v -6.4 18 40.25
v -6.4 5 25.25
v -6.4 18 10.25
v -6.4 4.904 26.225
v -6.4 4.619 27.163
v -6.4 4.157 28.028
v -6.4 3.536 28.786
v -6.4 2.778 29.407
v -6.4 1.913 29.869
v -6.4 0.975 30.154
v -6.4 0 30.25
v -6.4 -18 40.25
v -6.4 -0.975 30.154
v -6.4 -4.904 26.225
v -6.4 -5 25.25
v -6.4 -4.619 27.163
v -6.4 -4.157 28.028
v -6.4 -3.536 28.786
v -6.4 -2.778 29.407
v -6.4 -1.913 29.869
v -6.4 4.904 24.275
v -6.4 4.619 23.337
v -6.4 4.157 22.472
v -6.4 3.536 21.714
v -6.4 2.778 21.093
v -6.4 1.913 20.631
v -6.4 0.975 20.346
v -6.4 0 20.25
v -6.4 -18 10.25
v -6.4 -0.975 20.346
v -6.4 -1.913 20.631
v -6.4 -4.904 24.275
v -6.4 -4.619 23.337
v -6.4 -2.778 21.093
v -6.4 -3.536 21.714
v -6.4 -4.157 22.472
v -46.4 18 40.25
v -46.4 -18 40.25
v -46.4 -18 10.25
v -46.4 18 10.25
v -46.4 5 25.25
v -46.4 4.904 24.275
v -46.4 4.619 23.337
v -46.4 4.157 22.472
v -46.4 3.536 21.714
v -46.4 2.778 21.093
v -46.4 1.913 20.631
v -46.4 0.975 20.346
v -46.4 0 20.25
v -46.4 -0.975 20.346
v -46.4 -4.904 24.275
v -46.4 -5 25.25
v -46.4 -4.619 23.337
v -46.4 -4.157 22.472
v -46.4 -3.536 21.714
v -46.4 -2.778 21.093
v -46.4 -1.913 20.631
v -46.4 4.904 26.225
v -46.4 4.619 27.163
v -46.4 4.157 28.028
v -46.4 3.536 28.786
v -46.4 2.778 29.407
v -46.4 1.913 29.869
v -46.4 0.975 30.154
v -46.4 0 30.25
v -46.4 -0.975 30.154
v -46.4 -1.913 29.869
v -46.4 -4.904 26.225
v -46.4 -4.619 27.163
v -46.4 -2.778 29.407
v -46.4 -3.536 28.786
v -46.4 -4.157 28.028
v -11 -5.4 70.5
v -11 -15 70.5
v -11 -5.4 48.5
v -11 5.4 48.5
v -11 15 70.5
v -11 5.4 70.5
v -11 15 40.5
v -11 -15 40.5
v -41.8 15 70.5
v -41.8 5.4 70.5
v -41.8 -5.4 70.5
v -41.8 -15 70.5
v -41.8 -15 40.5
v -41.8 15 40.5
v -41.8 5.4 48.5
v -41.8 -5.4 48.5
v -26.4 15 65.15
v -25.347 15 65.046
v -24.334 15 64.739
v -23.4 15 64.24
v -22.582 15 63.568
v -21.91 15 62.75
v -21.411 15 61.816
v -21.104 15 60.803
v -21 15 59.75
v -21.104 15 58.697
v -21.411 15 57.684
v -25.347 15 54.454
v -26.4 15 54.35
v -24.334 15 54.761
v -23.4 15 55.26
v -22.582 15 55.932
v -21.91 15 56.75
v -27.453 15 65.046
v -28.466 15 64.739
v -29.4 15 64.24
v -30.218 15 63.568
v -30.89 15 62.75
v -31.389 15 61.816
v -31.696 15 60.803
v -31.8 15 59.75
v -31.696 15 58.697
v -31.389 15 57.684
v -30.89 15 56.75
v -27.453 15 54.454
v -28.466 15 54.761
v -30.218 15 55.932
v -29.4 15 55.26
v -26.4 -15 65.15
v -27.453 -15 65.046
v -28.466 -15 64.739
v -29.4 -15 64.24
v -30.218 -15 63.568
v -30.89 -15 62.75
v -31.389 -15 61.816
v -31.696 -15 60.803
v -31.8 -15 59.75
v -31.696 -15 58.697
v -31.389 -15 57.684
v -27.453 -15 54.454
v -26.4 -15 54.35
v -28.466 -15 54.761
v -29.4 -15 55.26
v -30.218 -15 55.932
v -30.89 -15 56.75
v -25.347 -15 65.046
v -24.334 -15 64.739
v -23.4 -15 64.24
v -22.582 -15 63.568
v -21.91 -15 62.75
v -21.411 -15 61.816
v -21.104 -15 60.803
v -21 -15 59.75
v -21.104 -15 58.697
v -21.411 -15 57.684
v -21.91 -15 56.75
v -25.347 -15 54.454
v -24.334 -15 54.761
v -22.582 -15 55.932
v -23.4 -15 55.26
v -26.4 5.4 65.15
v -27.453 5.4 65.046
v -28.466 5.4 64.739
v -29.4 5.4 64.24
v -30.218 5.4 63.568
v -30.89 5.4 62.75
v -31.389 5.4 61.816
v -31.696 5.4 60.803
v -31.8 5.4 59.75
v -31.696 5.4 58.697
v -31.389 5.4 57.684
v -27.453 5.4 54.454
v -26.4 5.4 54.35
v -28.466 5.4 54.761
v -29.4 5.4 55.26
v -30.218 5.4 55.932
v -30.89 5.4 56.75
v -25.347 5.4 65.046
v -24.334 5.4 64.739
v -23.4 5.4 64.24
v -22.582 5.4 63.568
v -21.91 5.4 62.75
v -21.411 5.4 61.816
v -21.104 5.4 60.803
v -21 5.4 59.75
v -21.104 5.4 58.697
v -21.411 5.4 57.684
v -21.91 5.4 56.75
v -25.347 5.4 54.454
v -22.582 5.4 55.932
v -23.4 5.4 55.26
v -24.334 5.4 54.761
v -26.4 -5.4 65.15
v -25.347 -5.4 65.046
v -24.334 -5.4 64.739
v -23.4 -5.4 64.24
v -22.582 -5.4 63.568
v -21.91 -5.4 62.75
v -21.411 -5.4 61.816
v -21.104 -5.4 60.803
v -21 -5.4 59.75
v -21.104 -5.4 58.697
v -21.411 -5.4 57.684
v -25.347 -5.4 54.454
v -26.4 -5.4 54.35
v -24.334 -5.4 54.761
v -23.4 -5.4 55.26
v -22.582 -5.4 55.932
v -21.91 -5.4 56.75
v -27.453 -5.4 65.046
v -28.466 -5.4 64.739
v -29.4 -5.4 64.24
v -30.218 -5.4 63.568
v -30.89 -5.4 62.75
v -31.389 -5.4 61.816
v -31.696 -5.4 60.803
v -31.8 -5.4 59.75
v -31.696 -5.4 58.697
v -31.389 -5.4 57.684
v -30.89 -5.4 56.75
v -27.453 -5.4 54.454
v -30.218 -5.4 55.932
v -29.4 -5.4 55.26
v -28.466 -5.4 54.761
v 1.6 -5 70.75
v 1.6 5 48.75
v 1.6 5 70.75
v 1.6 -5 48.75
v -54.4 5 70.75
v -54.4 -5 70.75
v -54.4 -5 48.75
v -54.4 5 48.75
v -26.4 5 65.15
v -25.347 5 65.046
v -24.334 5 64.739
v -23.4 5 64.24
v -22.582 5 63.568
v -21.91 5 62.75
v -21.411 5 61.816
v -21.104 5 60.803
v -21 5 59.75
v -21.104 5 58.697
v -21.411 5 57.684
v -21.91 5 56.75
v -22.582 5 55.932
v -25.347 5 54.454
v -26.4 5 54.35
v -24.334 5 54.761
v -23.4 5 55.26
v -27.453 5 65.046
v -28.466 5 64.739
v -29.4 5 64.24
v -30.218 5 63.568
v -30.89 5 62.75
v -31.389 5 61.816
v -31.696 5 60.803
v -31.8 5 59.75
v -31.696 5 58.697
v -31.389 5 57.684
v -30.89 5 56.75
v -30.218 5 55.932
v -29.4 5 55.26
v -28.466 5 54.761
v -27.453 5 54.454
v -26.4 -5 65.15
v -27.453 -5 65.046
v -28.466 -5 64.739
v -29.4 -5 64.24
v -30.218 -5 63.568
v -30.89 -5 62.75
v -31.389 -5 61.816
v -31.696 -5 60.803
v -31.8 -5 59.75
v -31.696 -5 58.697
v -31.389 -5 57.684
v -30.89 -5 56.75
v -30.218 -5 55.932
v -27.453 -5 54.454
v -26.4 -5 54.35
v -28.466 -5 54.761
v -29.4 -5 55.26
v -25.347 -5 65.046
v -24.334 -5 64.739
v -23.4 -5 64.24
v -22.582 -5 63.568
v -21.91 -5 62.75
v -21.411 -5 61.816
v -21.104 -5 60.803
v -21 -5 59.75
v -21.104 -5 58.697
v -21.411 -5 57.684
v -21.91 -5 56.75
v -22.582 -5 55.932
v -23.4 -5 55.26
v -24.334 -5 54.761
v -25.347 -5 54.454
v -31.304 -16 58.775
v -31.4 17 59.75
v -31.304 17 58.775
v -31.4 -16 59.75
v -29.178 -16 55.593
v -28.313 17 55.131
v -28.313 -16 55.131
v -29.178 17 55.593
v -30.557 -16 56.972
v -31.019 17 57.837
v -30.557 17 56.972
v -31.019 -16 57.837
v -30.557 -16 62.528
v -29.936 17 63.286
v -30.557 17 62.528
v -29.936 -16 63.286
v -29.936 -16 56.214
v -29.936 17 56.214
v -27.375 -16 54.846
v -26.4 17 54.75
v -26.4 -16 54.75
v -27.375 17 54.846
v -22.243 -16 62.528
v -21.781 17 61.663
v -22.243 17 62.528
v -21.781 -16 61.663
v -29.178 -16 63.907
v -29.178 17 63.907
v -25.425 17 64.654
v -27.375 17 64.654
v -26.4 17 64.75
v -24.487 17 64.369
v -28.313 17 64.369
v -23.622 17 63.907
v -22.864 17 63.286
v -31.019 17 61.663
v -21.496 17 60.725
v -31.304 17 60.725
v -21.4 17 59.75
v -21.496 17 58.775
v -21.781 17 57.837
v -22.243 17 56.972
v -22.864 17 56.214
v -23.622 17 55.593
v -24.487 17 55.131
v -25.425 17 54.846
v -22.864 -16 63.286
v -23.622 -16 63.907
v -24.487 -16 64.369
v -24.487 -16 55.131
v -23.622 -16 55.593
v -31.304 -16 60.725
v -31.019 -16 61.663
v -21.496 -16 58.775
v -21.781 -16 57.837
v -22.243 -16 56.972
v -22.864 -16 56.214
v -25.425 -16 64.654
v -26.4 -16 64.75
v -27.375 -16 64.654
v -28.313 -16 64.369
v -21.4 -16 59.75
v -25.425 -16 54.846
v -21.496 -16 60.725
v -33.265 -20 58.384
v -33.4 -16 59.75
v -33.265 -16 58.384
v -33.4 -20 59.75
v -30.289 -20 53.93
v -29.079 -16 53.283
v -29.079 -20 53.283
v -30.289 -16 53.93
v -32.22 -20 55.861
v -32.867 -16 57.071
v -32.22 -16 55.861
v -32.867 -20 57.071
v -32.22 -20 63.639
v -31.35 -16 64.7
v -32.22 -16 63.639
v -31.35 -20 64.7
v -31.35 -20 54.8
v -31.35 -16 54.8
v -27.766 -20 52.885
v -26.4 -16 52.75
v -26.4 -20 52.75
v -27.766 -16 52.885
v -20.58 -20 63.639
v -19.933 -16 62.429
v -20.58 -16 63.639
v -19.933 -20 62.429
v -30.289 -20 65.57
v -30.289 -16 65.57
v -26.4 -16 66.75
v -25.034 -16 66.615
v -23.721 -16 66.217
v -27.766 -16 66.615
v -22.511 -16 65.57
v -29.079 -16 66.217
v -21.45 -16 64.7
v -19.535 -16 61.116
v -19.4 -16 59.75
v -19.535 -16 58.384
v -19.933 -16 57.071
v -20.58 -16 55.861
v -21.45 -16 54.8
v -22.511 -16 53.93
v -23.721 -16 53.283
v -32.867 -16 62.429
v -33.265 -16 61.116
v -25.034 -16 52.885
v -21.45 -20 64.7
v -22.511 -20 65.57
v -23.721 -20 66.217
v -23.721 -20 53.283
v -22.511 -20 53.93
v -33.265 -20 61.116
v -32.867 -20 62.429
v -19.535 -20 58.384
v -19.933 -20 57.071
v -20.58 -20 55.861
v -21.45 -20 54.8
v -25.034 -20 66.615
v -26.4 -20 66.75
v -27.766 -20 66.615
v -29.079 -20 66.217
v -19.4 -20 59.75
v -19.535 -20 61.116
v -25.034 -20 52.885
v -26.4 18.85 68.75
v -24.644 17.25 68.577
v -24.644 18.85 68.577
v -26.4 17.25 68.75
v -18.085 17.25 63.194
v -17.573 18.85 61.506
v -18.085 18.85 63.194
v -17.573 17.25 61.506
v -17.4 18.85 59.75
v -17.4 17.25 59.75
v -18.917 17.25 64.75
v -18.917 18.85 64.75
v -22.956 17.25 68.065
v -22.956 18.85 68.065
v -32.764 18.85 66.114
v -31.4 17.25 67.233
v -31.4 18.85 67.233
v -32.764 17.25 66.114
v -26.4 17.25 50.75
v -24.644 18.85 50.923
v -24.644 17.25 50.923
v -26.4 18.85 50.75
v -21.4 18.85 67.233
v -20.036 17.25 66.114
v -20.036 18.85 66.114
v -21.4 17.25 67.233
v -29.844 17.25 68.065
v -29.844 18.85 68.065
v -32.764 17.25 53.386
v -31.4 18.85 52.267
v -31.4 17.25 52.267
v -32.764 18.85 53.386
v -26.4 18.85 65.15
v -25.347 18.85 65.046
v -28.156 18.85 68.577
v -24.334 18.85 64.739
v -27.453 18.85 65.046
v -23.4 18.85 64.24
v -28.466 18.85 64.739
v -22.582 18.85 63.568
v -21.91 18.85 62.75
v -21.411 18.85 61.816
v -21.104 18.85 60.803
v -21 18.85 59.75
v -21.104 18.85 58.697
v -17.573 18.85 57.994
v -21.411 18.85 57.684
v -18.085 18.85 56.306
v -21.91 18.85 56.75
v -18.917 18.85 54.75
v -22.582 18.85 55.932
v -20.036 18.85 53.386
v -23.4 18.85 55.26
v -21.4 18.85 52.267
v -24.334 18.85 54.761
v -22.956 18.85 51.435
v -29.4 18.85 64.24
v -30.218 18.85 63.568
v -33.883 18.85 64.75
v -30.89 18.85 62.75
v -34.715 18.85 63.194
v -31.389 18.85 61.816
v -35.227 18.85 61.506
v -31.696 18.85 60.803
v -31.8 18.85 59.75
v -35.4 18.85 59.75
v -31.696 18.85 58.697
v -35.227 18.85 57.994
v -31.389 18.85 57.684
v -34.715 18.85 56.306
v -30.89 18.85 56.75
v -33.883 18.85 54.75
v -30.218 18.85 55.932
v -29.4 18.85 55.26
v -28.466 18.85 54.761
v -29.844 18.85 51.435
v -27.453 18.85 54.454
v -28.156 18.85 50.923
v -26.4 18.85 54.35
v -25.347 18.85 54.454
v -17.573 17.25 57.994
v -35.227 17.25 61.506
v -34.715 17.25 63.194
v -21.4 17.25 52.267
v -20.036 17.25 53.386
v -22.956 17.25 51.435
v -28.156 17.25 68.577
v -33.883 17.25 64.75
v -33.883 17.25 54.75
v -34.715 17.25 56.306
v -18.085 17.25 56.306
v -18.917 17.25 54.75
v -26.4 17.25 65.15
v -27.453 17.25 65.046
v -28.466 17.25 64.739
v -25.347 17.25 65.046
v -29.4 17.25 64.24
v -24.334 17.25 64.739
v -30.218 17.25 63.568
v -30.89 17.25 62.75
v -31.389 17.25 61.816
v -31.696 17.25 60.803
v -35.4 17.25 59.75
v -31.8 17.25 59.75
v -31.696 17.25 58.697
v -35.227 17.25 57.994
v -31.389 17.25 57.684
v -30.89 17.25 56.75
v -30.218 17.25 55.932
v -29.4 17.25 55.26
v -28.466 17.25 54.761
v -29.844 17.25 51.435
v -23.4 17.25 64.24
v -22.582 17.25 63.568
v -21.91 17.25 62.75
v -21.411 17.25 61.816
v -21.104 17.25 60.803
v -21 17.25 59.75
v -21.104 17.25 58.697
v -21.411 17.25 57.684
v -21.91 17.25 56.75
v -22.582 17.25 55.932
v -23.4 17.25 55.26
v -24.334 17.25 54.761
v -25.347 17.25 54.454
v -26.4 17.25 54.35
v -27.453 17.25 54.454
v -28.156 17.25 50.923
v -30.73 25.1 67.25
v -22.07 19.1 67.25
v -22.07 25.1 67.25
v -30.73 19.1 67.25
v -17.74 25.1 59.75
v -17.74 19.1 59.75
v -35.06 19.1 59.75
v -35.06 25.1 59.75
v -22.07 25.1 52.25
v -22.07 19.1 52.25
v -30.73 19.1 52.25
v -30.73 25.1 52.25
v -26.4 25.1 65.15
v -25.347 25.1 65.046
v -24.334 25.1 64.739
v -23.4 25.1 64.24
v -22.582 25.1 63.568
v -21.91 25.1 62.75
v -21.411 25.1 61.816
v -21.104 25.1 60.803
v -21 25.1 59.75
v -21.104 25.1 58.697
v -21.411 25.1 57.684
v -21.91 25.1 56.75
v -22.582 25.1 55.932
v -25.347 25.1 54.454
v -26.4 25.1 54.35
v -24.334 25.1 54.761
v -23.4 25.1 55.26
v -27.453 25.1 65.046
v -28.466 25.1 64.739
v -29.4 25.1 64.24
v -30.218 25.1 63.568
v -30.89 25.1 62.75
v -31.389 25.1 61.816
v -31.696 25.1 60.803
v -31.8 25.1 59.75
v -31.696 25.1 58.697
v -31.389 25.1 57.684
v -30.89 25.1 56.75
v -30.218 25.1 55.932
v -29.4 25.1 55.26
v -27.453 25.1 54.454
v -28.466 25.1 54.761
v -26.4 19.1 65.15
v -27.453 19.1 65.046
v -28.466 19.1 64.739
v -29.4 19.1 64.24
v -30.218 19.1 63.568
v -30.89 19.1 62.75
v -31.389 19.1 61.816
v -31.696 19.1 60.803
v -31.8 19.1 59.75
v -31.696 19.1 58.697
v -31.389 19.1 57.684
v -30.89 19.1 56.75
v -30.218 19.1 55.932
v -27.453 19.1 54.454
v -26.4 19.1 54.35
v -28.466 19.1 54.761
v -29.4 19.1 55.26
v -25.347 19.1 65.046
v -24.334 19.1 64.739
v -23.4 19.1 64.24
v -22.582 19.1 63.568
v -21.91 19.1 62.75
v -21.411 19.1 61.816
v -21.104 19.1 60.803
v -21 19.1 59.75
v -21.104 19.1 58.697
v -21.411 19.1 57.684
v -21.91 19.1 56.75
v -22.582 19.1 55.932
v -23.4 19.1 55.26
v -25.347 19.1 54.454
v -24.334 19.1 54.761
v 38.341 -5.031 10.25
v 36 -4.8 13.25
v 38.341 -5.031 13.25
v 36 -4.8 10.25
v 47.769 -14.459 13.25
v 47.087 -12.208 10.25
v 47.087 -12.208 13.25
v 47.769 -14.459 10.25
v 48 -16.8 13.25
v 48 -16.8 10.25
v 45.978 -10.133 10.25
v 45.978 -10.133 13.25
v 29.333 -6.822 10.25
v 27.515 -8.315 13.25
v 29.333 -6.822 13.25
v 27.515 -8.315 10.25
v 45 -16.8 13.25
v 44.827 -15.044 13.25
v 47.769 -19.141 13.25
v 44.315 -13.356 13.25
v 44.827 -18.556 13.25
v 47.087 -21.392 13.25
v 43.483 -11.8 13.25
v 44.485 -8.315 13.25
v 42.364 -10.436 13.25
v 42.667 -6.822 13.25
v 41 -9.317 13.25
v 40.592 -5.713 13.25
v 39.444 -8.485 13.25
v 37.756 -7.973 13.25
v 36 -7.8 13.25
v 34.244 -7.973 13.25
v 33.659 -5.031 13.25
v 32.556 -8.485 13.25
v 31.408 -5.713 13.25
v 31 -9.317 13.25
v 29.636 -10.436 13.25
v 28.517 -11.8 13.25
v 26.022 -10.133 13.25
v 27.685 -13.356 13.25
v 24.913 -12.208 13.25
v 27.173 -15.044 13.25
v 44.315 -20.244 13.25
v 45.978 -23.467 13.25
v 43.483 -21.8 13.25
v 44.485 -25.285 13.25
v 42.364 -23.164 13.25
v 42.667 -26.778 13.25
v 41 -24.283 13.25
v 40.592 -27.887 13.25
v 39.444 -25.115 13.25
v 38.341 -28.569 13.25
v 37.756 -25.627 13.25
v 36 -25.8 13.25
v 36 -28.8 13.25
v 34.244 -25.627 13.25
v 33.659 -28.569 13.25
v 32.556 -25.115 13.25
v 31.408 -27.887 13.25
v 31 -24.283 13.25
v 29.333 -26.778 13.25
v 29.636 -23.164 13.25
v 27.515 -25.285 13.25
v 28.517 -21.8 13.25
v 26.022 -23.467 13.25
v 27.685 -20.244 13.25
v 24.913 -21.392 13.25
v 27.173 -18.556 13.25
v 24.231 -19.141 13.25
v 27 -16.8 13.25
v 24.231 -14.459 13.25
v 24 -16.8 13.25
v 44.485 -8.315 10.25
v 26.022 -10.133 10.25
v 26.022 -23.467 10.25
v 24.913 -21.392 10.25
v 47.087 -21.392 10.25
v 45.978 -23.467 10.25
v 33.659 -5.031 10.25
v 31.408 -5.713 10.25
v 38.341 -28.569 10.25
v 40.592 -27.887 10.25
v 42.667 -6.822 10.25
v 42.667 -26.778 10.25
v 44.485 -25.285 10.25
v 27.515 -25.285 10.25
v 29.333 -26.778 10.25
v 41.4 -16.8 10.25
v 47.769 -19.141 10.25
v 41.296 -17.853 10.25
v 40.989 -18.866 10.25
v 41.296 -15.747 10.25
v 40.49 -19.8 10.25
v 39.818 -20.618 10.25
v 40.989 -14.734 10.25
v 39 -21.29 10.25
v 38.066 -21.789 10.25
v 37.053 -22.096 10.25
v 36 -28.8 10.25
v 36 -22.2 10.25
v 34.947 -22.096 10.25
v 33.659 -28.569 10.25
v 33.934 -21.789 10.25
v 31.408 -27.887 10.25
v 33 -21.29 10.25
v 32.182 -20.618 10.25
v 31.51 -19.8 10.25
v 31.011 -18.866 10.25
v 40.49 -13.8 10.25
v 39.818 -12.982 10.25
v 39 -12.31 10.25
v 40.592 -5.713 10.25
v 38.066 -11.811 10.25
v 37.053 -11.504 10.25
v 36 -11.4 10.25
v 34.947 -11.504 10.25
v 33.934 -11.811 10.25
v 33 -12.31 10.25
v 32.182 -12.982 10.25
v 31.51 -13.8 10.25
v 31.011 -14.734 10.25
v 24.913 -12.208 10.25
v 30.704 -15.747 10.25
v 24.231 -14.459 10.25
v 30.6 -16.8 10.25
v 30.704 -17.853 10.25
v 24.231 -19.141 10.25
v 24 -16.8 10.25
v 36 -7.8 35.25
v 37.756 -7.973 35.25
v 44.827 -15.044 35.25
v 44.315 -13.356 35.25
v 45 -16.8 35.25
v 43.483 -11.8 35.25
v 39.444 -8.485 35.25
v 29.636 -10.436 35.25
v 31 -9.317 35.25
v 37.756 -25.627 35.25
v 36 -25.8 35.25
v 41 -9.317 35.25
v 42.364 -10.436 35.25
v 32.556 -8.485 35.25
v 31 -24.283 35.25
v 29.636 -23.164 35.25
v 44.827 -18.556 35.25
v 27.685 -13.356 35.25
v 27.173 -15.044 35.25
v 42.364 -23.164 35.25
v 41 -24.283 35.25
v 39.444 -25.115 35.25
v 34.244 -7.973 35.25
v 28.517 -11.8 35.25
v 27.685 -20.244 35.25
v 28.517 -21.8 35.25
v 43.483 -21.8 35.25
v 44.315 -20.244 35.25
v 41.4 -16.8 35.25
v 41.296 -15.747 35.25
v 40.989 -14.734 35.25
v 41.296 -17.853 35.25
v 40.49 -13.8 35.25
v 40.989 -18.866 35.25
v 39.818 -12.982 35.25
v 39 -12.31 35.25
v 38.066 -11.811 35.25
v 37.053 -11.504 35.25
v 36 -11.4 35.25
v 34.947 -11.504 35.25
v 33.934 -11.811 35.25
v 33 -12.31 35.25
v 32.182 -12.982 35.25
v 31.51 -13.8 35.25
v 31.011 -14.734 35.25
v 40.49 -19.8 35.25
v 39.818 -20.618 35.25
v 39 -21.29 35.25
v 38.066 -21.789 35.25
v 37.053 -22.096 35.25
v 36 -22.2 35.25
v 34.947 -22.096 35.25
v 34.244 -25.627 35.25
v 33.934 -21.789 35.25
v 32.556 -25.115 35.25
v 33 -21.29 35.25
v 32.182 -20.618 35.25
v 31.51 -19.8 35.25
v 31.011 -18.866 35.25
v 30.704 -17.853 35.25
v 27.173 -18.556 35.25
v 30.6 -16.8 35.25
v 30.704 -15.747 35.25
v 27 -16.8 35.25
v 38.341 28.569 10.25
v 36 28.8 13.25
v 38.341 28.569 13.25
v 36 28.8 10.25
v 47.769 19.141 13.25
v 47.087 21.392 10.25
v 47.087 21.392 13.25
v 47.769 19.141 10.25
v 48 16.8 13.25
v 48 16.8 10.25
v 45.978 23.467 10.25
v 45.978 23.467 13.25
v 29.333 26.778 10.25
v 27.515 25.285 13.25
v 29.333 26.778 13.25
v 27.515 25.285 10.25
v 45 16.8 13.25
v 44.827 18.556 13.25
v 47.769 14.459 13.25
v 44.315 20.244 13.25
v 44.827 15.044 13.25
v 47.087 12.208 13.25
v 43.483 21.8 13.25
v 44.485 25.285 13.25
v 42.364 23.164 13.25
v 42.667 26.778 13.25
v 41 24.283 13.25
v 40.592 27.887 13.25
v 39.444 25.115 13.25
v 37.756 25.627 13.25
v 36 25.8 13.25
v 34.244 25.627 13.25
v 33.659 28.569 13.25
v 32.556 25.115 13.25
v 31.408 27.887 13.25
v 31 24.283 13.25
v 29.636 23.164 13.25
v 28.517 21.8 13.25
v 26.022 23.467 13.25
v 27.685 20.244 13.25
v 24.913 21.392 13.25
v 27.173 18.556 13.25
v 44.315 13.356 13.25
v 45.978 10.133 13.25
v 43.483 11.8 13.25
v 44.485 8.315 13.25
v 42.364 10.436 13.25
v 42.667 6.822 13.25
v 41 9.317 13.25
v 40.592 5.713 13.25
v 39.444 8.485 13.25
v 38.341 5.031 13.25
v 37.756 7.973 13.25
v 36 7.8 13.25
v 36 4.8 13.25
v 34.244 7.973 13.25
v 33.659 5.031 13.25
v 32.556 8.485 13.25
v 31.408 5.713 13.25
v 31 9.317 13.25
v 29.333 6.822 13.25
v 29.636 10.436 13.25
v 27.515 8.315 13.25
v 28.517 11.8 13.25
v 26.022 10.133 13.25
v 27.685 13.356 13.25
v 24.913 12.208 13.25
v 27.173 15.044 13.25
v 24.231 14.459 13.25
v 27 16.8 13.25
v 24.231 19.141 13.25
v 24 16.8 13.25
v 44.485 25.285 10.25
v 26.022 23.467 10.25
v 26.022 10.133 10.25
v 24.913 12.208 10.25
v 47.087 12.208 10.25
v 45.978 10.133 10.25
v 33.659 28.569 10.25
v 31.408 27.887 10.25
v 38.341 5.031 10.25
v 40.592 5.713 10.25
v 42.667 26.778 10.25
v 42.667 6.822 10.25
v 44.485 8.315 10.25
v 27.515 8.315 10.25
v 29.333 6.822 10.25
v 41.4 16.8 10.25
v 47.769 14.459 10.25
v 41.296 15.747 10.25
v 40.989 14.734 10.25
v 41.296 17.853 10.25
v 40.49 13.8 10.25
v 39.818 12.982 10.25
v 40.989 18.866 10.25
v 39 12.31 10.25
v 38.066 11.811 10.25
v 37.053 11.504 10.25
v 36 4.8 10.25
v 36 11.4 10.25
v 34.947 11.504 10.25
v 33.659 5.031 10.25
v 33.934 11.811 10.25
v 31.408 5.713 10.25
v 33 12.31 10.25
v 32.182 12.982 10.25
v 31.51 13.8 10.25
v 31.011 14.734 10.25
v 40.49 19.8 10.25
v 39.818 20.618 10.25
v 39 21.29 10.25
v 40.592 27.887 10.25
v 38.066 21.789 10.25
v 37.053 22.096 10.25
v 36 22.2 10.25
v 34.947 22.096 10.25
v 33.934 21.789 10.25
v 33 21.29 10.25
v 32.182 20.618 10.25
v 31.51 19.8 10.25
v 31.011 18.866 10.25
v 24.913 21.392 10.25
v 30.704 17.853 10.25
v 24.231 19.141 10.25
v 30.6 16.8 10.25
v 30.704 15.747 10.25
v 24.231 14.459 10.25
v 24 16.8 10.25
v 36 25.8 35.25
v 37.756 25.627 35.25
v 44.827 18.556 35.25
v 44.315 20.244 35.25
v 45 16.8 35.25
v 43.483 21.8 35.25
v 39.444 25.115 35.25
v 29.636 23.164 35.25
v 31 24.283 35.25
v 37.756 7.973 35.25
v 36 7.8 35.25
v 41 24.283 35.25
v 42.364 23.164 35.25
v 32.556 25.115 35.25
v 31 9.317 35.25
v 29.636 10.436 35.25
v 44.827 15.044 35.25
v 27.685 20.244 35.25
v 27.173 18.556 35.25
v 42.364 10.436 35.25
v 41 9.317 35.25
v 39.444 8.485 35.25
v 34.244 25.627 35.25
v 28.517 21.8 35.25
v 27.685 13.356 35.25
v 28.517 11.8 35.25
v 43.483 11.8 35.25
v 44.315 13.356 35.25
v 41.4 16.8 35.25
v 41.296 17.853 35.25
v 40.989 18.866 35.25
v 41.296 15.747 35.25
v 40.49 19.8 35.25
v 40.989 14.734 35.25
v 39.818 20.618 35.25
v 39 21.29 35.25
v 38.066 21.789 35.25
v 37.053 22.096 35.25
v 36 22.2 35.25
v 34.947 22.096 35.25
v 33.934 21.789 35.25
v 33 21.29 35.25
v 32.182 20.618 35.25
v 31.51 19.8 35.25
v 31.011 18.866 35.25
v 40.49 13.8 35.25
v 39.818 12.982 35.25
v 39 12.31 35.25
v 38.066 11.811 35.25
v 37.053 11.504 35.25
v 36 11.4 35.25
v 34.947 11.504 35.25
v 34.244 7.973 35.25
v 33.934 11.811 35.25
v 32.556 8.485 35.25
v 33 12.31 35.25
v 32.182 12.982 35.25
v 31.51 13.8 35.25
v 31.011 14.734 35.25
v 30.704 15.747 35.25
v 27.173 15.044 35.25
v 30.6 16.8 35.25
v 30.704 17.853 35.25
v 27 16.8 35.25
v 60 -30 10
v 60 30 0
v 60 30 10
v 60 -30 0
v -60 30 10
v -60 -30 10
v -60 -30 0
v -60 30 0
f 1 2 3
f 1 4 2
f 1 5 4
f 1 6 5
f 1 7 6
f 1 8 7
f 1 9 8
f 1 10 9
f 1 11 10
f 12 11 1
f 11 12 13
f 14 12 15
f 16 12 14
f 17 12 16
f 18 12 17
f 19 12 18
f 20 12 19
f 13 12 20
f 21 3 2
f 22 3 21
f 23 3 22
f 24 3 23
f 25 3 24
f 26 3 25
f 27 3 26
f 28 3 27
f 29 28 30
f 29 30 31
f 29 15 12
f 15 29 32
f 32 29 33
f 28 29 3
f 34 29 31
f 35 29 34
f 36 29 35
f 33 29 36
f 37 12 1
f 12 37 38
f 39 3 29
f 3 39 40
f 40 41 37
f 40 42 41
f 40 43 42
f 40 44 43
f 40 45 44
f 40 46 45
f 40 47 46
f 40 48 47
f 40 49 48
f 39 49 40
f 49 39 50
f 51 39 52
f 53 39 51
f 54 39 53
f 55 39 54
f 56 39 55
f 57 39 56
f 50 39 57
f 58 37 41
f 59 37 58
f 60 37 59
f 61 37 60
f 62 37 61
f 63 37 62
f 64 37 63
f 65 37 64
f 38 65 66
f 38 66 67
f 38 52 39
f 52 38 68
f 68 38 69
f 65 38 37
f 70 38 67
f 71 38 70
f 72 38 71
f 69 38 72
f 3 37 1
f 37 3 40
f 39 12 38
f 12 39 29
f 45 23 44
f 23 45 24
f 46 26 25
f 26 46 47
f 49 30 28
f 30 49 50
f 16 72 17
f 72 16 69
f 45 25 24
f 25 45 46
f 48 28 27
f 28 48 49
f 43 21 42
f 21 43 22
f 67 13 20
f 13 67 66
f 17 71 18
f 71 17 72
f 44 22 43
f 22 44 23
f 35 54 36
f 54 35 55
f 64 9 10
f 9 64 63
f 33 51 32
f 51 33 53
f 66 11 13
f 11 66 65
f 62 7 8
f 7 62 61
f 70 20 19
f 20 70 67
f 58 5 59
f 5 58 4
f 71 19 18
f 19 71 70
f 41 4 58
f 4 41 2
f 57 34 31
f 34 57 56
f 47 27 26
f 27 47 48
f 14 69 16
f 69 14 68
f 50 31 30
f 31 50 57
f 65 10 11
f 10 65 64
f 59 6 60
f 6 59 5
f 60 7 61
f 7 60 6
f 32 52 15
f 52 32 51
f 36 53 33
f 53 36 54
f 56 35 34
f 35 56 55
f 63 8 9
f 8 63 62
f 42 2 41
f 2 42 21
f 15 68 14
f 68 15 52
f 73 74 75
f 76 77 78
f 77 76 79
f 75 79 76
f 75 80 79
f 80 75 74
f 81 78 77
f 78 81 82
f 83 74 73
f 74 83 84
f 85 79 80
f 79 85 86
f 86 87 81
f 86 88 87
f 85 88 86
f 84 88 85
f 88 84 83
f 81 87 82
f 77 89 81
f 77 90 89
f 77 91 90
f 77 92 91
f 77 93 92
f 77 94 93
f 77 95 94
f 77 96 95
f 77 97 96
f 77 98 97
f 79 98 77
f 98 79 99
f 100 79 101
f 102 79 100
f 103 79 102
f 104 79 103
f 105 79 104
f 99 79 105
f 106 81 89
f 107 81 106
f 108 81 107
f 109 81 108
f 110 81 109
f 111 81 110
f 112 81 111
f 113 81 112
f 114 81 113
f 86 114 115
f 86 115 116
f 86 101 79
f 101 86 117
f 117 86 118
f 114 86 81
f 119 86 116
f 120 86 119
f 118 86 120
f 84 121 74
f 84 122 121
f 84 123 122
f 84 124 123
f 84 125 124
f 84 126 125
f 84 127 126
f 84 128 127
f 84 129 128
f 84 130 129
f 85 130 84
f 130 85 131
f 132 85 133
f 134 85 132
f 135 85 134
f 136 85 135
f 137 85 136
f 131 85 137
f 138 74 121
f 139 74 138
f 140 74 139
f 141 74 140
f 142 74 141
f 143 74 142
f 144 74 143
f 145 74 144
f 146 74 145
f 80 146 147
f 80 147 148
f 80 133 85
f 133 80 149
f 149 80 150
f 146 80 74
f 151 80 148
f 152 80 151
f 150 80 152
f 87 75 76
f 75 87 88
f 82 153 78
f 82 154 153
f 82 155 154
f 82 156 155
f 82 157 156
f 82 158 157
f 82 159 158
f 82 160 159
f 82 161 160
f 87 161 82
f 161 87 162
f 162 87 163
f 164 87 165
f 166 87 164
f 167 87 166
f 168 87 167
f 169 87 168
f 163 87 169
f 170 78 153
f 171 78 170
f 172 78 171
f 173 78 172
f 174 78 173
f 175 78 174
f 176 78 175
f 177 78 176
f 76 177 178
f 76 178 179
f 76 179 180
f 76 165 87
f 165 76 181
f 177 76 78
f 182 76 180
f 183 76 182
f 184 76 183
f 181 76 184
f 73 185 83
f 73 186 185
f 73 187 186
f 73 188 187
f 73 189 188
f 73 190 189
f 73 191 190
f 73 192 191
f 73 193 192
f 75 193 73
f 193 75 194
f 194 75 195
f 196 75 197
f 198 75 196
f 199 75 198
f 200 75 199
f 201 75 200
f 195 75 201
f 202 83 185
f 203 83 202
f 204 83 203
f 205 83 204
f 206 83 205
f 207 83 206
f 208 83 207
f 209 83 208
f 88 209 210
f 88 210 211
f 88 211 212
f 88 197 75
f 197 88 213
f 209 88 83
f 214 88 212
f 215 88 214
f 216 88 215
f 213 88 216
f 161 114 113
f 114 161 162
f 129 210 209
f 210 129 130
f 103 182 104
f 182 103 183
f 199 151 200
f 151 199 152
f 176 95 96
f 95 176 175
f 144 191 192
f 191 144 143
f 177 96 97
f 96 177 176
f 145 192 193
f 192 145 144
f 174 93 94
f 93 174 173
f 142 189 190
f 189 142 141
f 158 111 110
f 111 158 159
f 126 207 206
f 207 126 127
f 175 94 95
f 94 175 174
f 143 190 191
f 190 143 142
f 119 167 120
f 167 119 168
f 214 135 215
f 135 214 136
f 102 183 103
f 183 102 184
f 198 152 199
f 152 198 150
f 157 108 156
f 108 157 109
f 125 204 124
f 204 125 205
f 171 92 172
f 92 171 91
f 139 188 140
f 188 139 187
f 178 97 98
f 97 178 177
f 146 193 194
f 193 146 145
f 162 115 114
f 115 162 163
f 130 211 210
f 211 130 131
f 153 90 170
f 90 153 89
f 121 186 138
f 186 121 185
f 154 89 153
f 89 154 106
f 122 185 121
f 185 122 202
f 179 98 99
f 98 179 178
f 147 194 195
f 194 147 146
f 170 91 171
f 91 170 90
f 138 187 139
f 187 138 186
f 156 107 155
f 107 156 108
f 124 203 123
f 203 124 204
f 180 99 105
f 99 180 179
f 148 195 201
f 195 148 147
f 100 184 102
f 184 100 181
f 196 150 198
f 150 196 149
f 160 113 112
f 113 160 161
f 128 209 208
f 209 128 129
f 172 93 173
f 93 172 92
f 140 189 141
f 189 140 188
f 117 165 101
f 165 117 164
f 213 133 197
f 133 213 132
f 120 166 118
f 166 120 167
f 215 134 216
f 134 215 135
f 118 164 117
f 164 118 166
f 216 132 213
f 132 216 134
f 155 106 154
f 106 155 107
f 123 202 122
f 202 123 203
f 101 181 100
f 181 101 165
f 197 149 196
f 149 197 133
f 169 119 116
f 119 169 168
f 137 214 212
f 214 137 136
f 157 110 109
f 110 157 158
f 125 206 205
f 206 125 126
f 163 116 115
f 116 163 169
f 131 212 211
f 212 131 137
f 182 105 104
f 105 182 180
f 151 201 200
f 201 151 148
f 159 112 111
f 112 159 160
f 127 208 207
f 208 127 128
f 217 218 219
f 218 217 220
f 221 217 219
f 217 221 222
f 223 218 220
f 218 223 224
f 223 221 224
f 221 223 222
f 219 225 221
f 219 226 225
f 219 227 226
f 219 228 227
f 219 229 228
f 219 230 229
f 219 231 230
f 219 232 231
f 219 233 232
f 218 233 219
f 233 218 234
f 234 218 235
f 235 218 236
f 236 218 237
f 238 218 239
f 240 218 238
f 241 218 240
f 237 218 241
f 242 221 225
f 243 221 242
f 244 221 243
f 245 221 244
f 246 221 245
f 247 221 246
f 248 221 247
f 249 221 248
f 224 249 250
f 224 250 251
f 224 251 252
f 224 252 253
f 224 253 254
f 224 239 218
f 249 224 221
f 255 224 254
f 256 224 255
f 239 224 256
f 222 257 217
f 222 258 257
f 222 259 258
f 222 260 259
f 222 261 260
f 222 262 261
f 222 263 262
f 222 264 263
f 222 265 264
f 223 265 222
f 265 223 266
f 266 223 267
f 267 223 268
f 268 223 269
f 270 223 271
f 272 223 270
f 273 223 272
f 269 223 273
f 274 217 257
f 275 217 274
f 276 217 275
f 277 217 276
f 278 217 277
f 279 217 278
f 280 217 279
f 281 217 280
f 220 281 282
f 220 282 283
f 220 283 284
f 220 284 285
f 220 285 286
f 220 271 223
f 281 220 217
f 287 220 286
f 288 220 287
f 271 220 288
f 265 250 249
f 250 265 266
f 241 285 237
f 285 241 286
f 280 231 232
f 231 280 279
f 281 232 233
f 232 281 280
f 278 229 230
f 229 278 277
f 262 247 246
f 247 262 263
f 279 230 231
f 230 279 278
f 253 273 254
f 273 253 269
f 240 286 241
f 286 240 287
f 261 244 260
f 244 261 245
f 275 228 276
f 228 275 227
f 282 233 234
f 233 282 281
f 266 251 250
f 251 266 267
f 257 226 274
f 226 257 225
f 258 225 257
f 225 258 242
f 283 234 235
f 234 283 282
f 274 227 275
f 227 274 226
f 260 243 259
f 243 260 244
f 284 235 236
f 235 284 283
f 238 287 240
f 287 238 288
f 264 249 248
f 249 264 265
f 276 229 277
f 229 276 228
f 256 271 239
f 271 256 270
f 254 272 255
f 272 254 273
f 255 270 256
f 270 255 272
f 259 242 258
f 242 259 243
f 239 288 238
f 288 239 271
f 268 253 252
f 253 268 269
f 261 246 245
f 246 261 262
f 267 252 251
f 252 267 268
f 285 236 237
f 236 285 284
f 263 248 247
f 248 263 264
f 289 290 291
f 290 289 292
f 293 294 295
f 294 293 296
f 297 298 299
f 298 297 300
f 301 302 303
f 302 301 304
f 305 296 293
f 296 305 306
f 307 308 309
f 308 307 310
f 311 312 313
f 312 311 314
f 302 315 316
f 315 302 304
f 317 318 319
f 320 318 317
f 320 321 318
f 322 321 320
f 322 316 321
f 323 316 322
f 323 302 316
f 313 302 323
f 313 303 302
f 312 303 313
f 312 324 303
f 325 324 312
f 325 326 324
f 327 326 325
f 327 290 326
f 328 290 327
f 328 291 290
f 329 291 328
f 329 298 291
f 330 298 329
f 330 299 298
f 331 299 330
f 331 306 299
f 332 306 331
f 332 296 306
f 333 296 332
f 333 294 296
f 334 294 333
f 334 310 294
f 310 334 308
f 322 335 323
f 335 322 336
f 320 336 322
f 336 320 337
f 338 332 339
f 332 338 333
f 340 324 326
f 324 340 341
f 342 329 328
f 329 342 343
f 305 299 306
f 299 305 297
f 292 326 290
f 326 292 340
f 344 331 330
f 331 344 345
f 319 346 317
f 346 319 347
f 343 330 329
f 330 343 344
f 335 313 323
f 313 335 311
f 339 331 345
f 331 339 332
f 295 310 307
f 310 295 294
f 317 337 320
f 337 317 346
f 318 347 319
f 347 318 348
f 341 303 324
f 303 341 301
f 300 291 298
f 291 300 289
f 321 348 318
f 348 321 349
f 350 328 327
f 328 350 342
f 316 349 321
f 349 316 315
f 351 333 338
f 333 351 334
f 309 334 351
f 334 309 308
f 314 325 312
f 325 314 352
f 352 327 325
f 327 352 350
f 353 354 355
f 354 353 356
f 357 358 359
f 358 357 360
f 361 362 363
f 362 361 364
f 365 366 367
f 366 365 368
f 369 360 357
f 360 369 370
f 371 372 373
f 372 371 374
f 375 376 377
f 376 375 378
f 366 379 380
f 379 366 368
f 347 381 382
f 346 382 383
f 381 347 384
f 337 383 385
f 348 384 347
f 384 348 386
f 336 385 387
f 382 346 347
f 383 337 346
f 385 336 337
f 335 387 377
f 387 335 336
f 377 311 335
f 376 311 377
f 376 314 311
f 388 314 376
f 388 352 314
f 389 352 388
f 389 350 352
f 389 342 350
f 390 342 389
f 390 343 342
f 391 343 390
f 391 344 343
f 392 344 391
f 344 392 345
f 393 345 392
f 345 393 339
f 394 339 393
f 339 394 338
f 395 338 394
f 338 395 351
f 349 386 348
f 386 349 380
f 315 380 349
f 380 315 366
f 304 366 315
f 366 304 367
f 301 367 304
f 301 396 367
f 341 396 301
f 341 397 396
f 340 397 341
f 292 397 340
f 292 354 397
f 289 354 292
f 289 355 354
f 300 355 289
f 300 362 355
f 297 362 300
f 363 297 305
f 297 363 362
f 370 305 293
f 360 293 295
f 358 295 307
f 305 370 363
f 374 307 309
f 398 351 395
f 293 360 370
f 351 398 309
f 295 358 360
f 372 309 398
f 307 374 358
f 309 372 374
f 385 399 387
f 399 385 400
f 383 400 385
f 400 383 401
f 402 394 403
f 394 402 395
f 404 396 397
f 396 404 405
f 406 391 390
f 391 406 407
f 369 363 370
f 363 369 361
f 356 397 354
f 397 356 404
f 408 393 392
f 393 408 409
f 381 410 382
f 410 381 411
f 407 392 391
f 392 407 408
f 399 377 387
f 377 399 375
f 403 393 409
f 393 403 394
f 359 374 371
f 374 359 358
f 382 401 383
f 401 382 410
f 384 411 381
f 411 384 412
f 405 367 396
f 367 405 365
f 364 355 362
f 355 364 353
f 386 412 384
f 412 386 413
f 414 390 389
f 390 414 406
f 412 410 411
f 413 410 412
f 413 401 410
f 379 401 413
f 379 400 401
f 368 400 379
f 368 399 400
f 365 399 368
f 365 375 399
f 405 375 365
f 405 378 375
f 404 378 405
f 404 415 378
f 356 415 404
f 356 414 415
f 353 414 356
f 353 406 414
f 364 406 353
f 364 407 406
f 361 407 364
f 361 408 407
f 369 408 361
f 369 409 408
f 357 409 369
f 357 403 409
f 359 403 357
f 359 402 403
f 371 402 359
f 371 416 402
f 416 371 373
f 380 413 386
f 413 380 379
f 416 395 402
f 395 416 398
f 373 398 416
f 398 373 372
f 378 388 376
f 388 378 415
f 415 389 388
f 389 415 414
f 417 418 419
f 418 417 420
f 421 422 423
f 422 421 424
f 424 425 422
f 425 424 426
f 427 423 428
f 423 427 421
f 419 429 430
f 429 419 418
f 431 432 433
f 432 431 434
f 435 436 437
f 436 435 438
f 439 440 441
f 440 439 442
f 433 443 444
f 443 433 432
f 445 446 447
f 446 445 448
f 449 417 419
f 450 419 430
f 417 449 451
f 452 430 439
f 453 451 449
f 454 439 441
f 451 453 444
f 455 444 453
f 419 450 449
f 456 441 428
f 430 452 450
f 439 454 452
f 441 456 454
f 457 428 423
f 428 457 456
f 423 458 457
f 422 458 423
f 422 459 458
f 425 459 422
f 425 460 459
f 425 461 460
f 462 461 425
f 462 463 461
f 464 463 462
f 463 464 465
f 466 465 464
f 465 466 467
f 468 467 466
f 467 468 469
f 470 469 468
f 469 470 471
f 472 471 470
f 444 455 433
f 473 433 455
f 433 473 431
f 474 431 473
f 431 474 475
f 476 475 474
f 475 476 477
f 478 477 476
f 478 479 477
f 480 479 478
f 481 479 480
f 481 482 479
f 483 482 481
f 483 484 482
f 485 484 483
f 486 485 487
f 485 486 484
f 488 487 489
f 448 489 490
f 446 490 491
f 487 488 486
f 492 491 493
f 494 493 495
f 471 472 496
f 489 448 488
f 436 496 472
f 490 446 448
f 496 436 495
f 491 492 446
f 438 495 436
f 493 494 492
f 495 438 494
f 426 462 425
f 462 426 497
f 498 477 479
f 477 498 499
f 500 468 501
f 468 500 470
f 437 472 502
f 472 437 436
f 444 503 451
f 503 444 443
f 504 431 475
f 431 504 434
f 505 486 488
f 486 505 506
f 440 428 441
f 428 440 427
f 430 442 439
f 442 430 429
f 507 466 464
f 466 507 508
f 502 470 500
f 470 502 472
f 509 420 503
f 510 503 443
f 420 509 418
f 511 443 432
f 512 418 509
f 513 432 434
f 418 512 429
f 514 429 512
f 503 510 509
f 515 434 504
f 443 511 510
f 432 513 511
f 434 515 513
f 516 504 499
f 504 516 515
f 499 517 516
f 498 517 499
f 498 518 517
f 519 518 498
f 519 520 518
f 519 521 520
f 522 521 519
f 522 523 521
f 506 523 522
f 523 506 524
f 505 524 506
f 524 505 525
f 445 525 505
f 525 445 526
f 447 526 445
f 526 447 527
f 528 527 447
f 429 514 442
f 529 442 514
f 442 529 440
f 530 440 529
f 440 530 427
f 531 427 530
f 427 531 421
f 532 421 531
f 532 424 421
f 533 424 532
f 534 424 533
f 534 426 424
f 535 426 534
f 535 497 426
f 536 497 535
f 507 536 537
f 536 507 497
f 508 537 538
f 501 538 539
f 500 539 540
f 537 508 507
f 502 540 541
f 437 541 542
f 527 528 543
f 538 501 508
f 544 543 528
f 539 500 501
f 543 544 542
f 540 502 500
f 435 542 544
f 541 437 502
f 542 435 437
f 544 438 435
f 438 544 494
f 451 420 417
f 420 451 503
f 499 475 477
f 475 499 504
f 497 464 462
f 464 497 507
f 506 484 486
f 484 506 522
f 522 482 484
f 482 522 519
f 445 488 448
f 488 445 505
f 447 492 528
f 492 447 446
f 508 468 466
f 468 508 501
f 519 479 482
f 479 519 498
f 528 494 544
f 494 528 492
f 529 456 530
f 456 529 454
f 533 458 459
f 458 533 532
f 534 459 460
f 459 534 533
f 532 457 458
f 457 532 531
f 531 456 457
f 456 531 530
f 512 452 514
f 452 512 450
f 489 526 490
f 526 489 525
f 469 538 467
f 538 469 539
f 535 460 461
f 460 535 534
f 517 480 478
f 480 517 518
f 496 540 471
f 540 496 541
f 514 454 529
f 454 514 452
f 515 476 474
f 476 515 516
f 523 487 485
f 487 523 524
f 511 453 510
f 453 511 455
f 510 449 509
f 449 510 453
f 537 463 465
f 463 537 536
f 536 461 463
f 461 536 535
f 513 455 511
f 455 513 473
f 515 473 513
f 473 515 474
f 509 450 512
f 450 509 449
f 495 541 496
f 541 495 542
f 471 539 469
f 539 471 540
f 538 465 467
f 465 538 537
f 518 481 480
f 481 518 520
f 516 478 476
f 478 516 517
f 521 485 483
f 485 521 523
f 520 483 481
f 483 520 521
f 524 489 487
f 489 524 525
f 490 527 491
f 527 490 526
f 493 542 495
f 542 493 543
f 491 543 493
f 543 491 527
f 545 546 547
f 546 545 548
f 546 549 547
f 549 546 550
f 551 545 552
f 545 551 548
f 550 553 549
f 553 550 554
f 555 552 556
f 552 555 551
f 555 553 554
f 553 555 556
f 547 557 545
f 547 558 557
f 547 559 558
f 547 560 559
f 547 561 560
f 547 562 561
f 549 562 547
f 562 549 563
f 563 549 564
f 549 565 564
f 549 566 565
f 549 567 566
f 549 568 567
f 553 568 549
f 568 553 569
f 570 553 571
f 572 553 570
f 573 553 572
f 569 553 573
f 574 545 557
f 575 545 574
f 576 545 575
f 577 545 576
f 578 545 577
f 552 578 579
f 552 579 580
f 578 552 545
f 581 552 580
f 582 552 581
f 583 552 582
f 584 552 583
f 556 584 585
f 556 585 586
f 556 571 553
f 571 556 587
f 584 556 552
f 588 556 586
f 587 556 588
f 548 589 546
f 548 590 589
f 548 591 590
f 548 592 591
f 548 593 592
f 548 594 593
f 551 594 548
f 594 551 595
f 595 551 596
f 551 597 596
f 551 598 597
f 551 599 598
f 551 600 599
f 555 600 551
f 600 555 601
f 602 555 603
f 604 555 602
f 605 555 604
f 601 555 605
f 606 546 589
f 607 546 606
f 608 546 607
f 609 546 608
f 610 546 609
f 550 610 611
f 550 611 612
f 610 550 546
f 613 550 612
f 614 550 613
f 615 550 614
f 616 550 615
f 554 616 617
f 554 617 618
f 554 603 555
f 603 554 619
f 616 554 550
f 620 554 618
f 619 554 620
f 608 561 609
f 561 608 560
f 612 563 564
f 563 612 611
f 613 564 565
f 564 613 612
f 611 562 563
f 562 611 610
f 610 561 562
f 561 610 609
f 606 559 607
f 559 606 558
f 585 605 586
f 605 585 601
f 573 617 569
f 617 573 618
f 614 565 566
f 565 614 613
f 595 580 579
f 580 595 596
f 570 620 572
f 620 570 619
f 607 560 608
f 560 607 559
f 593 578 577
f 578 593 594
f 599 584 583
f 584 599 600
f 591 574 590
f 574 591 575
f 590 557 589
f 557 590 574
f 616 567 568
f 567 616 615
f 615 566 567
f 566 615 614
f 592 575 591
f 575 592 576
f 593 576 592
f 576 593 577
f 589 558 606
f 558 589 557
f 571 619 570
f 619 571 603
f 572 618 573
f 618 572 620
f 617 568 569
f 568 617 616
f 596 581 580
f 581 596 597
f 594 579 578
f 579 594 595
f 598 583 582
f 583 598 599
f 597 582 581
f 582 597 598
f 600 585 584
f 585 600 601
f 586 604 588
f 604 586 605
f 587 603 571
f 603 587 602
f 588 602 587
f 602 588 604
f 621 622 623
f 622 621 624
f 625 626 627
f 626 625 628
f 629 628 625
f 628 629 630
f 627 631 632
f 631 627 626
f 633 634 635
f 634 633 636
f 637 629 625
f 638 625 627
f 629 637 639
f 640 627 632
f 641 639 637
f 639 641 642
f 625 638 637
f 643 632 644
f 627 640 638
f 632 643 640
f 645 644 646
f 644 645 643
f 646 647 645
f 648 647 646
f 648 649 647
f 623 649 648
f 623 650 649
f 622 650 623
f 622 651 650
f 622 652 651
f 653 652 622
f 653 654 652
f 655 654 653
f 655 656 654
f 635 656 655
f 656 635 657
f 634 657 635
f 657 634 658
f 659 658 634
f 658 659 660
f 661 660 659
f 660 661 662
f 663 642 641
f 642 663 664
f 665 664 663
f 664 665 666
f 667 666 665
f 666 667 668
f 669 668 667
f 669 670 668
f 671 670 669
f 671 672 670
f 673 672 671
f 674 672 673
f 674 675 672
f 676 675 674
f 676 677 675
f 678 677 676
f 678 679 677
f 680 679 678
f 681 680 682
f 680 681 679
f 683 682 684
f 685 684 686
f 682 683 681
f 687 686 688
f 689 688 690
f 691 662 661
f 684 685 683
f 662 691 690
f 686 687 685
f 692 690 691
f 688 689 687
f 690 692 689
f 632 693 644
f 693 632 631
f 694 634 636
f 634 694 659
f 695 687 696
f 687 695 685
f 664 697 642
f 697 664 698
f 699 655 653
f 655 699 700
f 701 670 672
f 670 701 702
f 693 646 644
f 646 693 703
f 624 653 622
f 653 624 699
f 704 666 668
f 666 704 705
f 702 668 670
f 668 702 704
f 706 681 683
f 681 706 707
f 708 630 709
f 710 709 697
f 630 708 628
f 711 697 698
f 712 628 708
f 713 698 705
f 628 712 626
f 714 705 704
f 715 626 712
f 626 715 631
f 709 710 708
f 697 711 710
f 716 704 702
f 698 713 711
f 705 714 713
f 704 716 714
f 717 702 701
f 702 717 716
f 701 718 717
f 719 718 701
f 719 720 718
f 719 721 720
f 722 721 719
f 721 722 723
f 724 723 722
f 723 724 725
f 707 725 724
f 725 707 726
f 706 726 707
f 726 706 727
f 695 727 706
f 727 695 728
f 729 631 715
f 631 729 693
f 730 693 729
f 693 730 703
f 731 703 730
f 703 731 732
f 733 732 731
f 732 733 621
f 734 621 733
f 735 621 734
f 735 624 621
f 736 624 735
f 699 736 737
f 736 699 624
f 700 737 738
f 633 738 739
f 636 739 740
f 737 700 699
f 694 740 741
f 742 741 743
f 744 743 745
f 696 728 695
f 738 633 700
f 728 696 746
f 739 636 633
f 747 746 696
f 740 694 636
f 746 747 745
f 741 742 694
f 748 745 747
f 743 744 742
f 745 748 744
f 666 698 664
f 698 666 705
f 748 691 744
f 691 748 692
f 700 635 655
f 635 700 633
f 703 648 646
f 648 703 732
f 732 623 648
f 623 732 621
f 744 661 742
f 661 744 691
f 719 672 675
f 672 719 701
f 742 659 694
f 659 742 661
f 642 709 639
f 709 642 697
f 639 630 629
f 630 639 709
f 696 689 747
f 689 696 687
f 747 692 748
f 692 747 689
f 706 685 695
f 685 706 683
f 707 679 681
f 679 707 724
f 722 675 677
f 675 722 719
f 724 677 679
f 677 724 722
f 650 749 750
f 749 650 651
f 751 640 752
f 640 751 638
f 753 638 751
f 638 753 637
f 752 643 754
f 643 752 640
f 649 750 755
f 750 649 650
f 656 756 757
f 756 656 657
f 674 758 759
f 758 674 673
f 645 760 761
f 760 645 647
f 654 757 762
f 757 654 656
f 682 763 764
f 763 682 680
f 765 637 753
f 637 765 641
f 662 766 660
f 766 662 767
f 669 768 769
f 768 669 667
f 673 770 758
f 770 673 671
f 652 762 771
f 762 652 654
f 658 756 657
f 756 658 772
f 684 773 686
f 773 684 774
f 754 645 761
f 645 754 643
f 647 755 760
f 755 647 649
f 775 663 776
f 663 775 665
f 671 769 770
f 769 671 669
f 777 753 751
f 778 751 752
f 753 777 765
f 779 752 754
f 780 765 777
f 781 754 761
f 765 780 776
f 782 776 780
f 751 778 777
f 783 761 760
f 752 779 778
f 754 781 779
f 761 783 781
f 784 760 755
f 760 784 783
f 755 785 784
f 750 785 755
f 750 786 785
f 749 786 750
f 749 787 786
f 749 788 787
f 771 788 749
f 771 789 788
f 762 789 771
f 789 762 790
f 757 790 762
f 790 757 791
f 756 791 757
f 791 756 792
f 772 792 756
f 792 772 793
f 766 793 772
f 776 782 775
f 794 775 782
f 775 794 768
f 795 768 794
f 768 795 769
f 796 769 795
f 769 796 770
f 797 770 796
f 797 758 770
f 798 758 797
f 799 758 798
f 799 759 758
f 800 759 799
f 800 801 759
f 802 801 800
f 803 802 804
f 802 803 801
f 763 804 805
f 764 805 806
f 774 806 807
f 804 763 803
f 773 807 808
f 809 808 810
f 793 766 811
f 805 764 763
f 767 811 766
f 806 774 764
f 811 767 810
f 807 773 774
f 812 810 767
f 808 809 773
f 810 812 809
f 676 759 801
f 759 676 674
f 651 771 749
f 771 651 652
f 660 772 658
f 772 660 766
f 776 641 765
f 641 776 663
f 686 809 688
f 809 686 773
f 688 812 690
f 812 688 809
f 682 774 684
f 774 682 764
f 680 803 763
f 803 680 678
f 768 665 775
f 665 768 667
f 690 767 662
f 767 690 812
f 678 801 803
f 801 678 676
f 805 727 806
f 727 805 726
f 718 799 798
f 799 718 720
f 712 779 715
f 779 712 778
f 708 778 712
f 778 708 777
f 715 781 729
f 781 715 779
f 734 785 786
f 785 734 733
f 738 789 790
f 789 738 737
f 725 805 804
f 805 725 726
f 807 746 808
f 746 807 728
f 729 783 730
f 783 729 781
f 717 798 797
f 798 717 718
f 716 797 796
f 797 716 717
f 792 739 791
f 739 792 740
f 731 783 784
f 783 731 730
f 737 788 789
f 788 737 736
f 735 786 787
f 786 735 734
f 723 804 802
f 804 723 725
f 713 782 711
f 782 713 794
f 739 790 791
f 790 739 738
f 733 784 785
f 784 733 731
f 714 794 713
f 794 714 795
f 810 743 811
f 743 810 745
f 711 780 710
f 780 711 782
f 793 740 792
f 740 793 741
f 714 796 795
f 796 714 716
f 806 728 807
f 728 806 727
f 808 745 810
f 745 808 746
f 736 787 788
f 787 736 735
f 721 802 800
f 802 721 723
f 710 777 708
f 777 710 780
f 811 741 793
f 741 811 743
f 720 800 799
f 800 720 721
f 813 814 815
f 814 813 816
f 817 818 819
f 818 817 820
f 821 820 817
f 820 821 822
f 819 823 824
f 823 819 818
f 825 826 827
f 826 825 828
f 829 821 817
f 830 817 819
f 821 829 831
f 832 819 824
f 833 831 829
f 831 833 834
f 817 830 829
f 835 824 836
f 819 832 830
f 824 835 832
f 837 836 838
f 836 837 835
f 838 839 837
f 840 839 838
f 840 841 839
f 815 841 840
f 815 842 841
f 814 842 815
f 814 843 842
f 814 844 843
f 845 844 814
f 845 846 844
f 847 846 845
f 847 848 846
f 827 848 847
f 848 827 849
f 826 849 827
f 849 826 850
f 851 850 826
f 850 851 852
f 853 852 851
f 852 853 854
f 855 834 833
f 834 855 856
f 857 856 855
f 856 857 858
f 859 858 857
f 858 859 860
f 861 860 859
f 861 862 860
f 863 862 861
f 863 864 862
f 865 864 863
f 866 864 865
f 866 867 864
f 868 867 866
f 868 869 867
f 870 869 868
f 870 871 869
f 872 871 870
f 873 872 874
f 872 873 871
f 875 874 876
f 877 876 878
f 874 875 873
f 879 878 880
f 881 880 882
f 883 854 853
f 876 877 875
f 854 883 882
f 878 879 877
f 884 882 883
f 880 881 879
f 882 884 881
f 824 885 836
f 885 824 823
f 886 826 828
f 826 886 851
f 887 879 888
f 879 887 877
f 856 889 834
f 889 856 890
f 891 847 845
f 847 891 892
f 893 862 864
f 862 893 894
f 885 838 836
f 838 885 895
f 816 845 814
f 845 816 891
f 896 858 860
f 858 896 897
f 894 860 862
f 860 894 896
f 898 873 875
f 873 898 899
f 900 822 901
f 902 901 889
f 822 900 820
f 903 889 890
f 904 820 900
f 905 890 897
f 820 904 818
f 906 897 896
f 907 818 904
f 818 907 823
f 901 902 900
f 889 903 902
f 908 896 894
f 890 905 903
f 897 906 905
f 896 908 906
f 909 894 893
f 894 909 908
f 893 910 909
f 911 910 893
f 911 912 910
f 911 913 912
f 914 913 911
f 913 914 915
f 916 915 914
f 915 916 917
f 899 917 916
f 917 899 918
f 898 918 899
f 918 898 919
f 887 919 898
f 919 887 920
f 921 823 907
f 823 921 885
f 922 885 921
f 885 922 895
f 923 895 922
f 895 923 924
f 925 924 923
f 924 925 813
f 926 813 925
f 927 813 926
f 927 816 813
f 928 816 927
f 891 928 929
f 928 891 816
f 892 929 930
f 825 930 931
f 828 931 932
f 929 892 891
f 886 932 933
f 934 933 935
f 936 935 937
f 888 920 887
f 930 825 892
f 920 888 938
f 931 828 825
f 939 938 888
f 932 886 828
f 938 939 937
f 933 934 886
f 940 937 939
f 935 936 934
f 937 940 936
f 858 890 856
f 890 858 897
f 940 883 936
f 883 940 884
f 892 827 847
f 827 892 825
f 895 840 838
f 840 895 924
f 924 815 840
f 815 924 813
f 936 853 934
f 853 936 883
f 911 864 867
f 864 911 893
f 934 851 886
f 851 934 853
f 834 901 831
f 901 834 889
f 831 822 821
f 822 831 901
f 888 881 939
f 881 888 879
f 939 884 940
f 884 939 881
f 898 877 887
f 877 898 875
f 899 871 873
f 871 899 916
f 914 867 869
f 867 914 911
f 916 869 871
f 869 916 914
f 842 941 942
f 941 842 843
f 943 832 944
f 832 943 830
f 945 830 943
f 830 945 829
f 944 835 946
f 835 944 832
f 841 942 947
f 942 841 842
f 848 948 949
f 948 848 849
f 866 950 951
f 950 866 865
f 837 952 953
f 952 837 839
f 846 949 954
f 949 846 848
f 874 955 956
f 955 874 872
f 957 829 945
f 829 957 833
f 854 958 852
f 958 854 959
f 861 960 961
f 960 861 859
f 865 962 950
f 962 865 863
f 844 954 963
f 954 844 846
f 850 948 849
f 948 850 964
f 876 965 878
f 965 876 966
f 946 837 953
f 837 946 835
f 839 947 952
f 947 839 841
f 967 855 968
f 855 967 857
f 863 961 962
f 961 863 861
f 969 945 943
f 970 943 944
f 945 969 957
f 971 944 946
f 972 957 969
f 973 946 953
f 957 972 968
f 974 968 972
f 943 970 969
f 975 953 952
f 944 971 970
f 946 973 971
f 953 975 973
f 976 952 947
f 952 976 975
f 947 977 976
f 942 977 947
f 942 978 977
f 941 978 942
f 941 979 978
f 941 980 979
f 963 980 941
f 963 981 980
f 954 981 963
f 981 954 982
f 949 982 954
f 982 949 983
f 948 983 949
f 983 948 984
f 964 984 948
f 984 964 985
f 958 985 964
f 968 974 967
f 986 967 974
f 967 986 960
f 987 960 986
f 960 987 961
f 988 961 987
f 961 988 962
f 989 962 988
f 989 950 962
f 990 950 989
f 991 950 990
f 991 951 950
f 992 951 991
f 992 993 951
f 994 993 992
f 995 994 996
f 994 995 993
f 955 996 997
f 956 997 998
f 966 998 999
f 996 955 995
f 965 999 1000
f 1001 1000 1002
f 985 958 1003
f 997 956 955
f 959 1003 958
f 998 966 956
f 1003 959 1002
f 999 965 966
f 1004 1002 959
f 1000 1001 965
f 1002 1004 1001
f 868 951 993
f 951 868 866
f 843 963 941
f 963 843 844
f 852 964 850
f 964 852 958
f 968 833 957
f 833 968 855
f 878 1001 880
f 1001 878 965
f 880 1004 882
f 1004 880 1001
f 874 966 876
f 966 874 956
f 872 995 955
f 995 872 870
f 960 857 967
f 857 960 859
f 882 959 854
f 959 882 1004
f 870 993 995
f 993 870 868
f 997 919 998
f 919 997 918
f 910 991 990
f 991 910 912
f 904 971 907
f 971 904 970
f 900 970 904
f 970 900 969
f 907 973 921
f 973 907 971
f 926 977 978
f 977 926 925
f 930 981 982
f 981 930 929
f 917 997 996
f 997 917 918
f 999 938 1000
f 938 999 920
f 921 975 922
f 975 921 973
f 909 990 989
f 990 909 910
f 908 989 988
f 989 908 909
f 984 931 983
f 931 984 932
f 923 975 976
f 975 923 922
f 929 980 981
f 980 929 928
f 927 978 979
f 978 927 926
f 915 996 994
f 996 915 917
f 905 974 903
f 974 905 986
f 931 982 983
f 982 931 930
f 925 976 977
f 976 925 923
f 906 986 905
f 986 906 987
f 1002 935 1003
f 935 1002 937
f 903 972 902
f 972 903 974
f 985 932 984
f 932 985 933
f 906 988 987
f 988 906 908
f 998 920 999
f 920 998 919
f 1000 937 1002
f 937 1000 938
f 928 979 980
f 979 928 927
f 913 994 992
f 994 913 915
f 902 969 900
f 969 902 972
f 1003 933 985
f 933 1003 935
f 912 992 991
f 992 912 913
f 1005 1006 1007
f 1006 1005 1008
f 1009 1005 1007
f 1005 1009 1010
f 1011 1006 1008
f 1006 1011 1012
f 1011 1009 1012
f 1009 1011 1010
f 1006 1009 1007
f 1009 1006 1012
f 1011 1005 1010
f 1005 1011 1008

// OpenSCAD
$fn = 32;

// ------------------------------------------------------------------------
// Indexing jig: plate 120 x 60 mm, pin d10
// Every part is its own module, assembly() places every instance.
// ------------------------------------------------------------------------

// --- part 1 ---
module jig_plate() {
  difference() {
    translate([-60, -30, 0]) cube([120, 60, 10]);
  }
}

// --- part 2 ---
module locator_block() {
  difference() {
    translate([-20, -18, 0]) cube([40, 36, 30]);
    translate([0, 0, 15]) rotate([0, 90, 0]) cylinder(h = 42, d = 10, center = true);
  }
}

// --- part 3 ---
module index_fork() {
  difference() {
    translate([-15.4, -15, 0]) cube([30.8, 30, 30]);
    translate([-16.4, -5.4, 8]) cube([32.8, 10.8, 23]);
    translate([0, 0, 19.25]) rotate([90, 0, 0]) cylinder(h = 32, d = 10.8, center = true);
  }
}

// --- part 4 ---
module index_arm() {
  difference() {
    translate([-28, -5, 0]) cube([56, 10, 22]);
    translate([0, 0, 11]) rotate([90, 0, 0]) cylinder(h = 12, d = 10.8, center = true);
  }
}

// --- part 5 ---
module index_pin() {
  rotate([0, 90, 0]) cylinder(h = 34, d = 10, center = true);
  translate([-20, 0, 0]) rotate([0, 90, 0]) cylinder(h = 4, d = 14);
}

// --- part 6 ---
module pin_washer() {
  difference() {
      translate([0, 0, 0]) cylinder(h = 1.6, d = 18);
      translate([0, 0, -1]) cylinder(h = 3.6, d = 10.8);
    }
}

// --- part 7 ---
module lock_nut() {
  difference() {
    linear_extrude(height = 6) polygon(points = [[8.66, 0], [4.33, 7.5], [-4.33, 7.5], [-8.66, 0], [-4.33, -7.5], [4.33, -7.5]]);
    translate([0, 0, -1]) cylinder(h = 8, d = 10.8);
  }
}

// --- part 8 ---
module guide_bush_a() {
  difference() {
    union() {
      cylinder(h = 3, d = 24);
      translate([0, 0, 3]) cylinder(h = 22, d = 18);
    }
    translate([0, 0, -1]) cylinder(h = 27, d = 10.8);
  }
}

// --- part 9 ---
module guide_bush_b() {
  difference() {
    union() {
      cylinder(h = 3, d = 24);
      translate([0, 0, 3]) cylinder(h = 22, d = 18);
    }
    translate([0, 0, -1]) cylinder(h = 27, d = 10.8);
  }
}

// --- assembly ---
module assembly() {
  color([0.80, 0.24, 0.20]) translate([0, 0, 0]) rotate([0, 0, 0]) jig_plate();
  color([0.20, 0.45, 0.75]) translate([-26.4, 0, 10.25]) rotate([0, 0, 0]) locator_block();
  color([0.25, 0.62, 0.32]) translate([-26.4, 0, 40.5]) rotate([0, 0, 0]) index_fork();
  color([0.92, 0.70, 0.18]) translate([-26.4, 0, 48.75]) rotate([0, 0, 0]) index_arm();
  color([0.58, 0.35, 0.70]) translate([-26.4, 0, 59.75]) rotate([0, 0, 90]) index_pin();
  color([0.16, 0.66, 0.66]) translate([-26.4, 18.85, 59.75]) rotate([90, 0, 0]) pin_washer();
  color([0.85, 0.48, 0.18]) translate([-26.4, 25.1, 59.75]) rotate([90, 0, 0]) lock_nut();
  color([0.55, 0.60, 0.65]) translate([36, -16.8, 10.25]) rotate([0, 0, 0]) guide_bush_a();
  color([0.75, 0.30, 0.55]) translate([36, 16.8, 10.25]) rotate([0, 0, 0]) guide_bush_b();
}

assembly();
